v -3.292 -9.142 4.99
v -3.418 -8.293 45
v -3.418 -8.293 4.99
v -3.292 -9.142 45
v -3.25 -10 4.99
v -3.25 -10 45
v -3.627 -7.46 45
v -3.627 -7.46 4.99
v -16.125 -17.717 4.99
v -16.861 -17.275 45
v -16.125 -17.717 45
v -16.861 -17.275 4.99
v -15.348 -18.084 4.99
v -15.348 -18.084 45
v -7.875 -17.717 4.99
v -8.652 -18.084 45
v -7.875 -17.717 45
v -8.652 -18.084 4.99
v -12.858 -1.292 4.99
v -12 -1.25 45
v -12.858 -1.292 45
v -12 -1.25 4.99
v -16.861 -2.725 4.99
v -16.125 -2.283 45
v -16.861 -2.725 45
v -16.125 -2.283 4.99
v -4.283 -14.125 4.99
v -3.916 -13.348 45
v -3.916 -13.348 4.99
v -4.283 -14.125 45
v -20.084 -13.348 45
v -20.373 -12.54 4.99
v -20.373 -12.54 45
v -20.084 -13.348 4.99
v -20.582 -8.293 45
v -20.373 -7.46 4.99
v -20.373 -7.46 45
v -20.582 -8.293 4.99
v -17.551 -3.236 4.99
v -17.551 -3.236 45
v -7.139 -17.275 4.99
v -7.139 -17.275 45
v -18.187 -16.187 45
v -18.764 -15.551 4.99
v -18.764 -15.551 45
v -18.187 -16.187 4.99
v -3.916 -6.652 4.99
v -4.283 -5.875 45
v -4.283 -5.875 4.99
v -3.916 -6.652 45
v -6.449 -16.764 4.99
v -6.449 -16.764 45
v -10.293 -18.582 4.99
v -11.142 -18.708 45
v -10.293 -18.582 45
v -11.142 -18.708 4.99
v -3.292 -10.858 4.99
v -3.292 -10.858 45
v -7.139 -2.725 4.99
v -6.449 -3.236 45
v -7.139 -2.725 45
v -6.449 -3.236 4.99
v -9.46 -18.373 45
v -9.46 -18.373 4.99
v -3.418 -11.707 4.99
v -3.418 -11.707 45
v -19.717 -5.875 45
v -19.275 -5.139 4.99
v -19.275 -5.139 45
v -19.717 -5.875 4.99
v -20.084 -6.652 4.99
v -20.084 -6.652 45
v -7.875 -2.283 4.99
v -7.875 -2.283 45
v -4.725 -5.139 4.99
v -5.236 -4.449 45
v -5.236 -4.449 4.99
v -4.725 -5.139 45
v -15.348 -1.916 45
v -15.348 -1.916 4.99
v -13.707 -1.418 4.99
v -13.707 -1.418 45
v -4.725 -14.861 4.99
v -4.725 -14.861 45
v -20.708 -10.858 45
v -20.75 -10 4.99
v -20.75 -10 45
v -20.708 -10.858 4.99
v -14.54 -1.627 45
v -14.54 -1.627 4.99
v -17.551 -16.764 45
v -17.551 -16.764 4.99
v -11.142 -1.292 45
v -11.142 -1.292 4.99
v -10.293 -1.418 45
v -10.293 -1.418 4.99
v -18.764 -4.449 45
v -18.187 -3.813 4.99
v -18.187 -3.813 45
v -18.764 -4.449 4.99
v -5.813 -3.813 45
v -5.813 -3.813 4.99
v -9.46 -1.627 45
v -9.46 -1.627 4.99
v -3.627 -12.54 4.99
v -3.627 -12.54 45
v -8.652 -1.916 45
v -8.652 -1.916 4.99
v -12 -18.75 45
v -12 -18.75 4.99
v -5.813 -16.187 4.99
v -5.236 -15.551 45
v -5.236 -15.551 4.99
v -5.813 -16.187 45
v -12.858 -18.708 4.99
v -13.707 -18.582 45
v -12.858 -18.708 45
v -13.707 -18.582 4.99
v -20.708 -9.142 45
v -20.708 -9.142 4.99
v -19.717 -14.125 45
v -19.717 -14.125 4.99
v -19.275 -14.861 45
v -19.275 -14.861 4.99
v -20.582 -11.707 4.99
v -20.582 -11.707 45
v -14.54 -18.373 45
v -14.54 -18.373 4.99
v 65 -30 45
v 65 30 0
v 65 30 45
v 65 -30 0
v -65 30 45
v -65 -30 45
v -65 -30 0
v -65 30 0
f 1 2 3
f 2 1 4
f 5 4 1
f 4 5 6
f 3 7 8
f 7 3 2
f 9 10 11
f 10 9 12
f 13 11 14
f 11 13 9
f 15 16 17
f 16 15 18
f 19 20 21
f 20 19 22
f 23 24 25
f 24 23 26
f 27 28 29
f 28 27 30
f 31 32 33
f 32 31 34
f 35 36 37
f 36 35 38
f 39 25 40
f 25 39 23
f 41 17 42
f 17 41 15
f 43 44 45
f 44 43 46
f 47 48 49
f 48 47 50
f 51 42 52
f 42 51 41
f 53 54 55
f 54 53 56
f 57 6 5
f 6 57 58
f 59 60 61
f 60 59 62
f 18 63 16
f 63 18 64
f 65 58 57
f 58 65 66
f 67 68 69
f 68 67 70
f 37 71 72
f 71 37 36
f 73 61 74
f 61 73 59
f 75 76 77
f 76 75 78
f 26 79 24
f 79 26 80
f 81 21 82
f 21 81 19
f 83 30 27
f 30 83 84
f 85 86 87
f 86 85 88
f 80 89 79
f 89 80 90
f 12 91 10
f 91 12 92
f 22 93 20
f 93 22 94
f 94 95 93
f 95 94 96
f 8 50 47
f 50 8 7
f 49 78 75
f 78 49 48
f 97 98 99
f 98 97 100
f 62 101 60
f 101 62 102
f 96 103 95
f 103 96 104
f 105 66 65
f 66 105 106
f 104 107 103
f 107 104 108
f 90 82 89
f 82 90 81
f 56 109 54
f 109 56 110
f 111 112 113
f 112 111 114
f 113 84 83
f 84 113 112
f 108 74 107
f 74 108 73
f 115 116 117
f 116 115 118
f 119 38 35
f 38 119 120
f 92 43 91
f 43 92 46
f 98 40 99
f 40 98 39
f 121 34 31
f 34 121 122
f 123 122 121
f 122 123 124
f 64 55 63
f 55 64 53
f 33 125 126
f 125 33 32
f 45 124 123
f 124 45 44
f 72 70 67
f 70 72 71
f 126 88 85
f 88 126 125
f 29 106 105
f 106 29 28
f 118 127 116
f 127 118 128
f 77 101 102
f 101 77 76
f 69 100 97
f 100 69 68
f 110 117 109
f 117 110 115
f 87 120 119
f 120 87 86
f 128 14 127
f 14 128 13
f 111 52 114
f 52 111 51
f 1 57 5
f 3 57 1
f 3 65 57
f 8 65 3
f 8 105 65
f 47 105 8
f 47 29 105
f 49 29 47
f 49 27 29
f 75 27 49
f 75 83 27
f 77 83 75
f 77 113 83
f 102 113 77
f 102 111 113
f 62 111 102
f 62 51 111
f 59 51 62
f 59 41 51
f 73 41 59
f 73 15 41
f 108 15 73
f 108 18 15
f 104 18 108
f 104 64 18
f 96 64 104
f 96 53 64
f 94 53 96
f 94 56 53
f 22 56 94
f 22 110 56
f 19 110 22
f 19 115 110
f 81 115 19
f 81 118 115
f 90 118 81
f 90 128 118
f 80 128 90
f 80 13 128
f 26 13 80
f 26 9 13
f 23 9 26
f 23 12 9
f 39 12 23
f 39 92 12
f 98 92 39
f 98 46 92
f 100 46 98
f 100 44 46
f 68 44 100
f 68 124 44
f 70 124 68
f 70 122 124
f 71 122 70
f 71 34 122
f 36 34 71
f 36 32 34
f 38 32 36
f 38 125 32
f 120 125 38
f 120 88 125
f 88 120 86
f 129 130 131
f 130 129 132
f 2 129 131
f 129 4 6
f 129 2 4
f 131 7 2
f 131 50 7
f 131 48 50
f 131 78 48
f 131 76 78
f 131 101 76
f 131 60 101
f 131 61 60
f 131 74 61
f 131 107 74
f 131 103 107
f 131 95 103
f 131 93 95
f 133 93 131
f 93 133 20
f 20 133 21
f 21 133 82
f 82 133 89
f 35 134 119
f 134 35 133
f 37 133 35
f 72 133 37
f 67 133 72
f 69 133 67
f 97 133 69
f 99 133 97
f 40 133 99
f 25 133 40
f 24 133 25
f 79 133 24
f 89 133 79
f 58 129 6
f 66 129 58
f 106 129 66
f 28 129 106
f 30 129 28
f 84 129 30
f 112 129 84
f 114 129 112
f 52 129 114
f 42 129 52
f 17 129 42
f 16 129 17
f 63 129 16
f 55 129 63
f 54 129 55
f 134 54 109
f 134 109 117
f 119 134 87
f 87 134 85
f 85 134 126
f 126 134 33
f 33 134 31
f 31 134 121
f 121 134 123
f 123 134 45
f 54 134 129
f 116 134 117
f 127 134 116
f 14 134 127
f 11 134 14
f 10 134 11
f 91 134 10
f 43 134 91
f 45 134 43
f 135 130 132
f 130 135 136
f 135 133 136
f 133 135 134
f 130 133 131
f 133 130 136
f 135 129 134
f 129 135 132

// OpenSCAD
// Built by bench/smallmodels/features/compiler.py from a list of features.
$fn = 64;
difference() {
  union() {
    translate([0, 0, 0]) translate([-65, -30, 0]) cube([130, 60, 45]);
  }
  union() {
    translate([-12, -10, 4.99]) rotate([0, 0, 0]) cylinder(d = 17.5, h = 40.02);
    translate([-12, -10, 4.99]) rotate([0, 0, 0]) cylinder(d = 17.5, h = 40.02);
    translate([-12, -10, 4.99]) rotate([0, 0, 0]) cylinder(d = 17.5, h = 40.02);
    translate([-12, -10, 4.99]) rotate([0, 0, 0]) cylinder(d = 17.5, h = 40.02);
    translate([-12, -10, 4.99]) rotate([0, 0, 0]) cylinder(d = 17.5, h = 40.02);
  }
}
